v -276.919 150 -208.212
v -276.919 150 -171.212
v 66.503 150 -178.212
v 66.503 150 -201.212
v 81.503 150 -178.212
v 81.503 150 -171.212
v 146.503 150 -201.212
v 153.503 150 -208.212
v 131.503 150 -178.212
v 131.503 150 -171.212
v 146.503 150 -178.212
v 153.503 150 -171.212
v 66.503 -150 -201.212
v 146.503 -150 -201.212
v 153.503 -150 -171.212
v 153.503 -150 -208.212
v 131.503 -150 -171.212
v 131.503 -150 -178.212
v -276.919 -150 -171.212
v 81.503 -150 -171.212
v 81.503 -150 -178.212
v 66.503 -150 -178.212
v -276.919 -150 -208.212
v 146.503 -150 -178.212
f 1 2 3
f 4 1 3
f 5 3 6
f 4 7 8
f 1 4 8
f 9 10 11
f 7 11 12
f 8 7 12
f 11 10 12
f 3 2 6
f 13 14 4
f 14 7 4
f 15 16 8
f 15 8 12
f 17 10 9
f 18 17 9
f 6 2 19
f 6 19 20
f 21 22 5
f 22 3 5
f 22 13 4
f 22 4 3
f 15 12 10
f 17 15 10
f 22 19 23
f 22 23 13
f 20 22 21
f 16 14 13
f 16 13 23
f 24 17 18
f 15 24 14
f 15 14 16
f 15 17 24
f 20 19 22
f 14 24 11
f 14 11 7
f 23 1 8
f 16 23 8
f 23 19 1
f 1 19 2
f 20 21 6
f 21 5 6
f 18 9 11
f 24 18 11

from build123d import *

# Parameters (mm, degrees)
BOSS_EXTRUDE1_DEPTH = 150
SKETCH2_W           = 336.422734183
SKETCH2_H           = 300
BOSS_EXTRUDE2_DEPTH = 37


with BuildPart() as part:
    # Sketch1 → Boss-Extrude1 (new, symmetric)
    with BuildSketch(Plane(origin=(0, 0, 0), x_dir=(1, 0, 0), z_dir=(0, 1, 0))):
        Polygon((131.503336753, 178.212463787), (146.503336753, 178.212463787), (146.503336753, 201.212463787), (66.503336753, 201.212463787), (66.503336753, 178.212463787), (81.503336753, 178.212463787), (81.503336753, 171.212463787), (59.503336753, 171.212463787), (59.503336753, 208.212463787), (153.503336753, 208.212463787), (153.503336753, 171.212463787), (131.503336753, 171.212463787), align=None)
    extrude(amount=BOSS_EXTRUDE1_DEPTH, both=True)

    # Sketch2 → Boss-Extrude2 (add)
    with BuildSketch(Plane.XY.offset(-171.212463787)):
        with Locations((-108.708030338, 0)):
            Rectangle(SKETCH2_W, SKETCH2_H)
    extrude(amount=-BOSS_EXTRUDE2_DEPTH)


solid = part.part
